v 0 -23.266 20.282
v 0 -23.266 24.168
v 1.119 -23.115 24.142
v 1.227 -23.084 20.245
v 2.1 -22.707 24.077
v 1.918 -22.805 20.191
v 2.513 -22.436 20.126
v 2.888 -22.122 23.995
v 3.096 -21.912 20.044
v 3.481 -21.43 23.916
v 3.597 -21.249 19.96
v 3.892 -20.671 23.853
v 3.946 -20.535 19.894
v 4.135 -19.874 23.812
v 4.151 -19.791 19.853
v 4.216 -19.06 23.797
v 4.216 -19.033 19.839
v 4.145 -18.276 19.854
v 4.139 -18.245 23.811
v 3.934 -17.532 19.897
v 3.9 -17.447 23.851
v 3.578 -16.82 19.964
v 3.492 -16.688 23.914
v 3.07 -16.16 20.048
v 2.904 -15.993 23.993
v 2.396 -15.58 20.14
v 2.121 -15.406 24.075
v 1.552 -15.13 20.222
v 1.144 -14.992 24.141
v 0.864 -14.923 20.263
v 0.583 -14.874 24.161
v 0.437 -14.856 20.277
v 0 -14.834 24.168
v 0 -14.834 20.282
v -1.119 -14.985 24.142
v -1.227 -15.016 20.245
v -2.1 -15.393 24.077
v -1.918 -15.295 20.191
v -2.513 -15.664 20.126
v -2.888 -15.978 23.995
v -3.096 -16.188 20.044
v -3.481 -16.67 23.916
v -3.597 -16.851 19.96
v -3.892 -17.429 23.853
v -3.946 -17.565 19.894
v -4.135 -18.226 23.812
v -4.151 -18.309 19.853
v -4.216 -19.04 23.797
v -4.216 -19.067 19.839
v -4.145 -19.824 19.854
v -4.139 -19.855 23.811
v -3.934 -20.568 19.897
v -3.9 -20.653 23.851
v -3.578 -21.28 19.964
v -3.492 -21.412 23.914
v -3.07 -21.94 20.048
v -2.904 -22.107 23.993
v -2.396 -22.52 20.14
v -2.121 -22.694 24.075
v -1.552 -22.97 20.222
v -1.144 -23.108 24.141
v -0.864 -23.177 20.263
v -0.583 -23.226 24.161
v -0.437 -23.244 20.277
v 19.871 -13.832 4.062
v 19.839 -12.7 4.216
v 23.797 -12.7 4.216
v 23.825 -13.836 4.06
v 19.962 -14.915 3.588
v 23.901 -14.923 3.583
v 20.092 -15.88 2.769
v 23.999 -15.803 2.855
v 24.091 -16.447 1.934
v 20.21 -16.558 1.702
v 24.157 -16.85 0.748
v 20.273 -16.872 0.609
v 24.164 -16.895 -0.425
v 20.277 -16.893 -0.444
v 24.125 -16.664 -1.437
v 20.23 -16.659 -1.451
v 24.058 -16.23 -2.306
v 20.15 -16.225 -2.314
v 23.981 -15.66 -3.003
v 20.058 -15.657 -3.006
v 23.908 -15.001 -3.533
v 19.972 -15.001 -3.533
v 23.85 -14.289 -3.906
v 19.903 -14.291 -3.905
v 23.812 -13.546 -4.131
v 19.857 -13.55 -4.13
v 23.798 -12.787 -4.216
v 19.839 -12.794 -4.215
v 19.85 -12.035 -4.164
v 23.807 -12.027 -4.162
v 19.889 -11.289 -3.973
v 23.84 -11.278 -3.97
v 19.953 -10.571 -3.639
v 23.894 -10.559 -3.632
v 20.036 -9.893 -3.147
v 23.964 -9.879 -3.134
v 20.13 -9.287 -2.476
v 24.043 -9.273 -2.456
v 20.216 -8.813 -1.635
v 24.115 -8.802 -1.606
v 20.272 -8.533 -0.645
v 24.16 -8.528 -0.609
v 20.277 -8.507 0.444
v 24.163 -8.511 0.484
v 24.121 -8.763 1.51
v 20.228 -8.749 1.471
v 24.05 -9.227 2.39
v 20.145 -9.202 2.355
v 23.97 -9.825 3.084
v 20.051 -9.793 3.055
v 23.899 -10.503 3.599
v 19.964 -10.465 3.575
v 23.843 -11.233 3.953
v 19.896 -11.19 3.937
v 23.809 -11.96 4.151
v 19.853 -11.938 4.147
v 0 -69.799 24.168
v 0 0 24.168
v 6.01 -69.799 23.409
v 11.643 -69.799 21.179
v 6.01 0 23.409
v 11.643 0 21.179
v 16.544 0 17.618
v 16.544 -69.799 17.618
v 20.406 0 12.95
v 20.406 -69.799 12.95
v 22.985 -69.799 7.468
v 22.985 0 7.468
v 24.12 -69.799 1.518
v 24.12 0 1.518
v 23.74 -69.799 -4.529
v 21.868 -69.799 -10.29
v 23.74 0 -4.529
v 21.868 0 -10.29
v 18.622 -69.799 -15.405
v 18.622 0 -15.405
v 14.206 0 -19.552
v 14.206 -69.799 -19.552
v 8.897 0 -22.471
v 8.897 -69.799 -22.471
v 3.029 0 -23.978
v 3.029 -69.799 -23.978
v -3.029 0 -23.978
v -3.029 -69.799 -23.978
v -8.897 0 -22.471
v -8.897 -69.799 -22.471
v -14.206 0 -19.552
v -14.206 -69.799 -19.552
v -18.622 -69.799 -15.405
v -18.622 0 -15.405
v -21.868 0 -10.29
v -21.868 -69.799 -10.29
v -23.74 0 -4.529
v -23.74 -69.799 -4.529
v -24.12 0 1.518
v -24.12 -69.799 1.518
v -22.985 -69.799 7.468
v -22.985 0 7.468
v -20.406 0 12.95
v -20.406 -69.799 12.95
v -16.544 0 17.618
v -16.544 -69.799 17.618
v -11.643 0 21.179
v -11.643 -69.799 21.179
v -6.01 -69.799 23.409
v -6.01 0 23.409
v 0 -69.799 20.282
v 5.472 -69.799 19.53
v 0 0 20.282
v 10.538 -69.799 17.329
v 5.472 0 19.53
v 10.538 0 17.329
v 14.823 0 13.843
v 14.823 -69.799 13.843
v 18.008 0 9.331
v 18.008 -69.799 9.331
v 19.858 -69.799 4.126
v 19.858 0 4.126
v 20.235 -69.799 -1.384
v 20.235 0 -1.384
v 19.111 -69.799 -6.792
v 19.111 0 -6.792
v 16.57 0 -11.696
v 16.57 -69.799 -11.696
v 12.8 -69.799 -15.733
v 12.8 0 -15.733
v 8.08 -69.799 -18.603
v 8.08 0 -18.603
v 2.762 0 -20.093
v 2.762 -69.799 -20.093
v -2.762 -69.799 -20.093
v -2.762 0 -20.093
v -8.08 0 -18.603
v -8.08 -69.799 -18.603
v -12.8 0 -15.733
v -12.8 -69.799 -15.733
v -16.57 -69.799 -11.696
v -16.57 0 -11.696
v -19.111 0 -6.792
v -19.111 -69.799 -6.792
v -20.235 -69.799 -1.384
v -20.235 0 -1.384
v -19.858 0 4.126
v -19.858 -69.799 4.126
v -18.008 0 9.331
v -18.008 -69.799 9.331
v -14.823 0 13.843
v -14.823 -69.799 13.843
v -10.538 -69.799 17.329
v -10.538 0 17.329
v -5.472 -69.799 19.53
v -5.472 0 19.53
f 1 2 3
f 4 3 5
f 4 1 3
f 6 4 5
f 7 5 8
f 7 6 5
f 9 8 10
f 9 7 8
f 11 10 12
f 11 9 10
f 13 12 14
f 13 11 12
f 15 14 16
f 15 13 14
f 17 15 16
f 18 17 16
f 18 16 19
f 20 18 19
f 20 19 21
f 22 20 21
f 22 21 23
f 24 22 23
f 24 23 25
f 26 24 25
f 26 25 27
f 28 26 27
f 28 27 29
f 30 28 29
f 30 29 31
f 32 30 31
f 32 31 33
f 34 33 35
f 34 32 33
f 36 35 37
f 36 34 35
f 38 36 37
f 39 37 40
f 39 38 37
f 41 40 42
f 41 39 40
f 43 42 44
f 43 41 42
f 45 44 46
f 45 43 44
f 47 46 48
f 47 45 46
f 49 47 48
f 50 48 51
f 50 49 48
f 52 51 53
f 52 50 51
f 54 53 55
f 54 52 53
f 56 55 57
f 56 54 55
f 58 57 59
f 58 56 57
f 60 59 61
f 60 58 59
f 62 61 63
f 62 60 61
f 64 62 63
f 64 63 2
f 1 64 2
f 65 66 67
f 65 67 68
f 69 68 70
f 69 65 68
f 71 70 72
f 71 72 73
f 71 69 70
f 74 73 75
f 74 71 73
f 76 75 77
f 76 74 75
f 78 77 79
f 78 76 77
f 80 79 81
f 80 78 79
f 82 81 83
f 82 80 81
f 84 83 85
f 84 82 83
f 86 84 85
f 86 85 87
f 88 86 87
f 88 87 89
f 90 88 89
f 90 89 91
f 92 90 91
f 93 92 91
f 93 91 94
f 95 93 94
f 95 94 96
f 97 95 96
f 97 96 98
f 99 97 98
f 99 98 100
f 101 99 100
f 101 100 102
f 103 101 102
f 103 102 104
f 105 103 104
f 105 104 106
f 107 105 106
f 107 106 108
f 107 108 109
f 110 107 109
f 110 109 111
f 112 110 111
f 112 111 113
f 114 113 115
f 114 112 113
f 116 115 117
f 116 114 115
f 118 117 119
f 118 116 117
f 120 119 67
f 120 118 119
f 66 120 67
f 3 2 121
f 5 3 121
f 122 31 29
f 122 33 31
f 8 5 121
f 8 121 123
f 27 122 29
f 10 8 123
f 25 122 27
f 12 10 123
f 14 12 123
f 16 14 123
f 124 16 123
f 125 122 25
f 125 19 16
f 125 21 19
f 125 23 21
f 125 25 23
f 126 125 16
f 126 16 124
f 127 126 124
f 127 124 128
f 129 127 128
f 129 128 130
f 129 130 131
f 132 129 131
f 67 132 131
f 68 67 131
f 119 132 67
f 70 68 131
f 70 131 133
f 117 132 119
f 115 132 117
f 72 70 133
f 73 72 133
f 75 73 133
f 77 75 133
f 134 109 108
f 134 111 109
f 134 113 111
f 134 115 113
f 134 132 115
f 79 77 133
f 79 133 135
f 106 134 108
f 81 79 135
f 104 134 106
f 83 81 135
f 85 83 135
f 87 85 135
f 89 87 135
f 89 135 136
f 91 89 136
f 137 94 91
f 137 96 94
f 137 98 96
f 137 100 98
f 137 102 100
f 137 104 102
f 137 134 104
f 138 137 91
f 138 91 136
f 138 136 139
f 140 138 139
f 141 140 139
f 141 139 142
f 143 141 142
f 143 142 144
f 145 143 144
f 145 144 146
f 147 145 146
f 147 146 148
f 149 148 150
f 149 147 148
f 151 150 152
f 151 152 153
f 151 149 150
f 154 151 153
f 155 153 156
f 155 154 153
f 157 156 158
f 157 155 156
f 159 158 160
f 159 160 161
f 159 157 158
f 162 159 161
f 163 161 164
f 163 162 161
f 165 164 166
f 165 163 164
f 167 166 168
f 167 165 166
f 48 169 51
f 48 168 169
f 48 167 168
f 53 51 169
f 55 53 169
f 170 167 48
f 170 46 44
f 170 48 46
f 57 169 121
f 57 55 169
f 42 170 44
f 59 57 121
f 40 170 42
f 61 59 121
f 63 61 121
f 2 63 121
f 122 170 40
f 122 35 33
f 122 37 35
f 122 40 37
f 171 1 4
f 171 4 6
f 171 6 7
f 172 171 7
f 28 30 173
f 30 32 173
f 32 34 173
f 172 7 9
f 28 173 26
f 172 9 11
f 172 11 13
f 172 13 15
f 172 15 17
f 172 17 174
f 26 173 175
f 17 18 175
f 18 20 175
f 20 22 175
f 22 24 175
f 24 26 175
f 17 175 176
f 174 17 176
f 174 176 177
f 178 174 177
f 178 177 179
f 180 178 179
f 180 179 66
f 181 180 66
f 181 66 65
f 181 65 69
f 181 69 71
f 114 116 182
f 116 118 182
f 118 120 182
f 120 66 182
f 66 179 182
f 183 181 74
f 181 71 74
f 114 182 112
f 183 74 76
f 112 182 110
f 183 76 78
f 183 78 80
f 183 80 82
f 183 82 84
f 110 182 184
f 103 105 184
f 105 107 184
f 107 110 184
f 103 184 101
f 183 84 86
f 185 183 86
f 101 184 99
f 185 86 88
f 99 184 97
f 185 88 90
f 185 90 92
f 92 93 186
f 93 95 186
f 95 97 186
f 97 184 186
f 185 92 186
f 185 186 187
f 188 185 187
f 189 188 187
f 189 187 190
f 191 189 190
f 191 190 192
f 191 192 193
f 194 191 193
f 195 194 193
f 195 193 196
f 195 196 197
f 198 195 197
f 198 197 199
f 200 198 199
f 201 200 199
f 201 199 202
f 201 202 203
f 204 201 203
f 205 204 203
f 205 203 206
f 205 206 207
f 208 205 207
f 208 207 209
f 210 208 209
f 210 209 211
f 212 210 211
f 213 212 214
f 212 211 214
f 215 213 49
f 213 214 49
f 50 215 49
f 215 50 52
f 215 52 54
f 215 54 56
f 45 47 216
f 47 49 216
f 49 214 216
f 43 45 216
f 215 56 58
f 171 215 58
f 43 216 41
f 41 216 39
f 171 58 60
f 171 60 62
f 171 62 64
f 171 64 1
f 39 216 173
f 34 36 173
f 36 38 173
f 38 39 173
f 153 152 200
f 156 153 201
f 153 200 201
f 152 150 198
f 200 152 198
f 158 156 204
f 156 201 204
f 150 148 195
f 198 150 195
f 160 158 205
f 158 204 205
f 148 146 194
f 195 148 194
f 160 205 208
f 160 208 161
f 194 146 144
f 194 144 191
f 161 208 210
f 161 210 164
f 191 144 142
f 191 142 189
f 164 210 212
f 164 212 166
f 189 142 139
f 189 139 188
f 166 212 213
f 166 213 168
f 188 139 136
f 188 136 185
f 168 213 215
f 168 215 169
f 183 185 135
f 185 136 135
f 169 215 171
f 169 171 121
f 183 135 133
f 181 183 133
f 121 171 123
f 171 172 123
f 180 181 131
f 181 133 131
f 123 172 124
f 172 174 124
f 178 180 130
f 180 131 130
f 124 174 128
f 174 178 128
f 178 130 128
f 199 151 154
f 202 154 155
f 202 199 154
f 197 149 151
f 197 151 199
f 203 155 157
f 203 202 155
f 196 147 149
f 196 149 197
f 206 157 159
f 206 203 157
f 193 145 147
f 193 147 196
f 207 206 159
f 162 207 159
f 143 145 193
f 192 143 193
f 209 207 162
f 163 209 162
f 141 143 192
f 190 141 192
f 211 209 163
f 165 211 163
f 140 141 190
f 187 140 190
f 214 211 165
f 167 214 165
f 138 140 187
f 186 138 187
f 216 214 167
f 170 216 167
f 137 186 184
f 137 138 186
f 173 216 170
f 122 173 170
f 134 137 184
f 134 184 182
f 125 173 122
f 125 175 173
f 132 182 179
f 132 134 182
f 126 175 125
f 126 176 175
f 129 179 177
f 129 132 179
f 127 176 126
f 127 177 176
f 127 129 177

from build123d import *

# Parameters (mm, degrees)
SKETCH1_R           = 24.1681
BOSS_EXTRUDE1_DEPTH = 69.7992
SKETCH2_R           = 20.2819
CUT_EXTRUDE1_DEPTH  = 78.718224606
SKETCH3_R           = 4.2164
CUT_EXTRUDE2_DEPTH  = 69.7992
SKETCH4_R           = 4.2164
CUT_EXTRUDE3_DEPTH  = 69.7992


with BuildPart() as part:
    # Sketch1 → Boss-Extrude1 (new body)
    with BuildSketch(Plane(origin=(0, 0, 0), x_dir=(1, 0, 0), z_dir=(0, 1, 0))):
        with Locations(Location((0, 0, 0), (0, 0, 270))):
            Circle(SKETCH1_R)
    extrude(amount=-BOSS_EXTRUDE1_DEPTH)

    # Sketch2 → Cut-Extrude1 (cut, through all)
    with BuildSketch(Plane(origin=(0, 0, 0), x_dir=(1, 0, 0), z_dir=(0, 1, 0))):
        with Locations(Location((0, 0, 0), (0, 0, 270))):
            Circle(SKETCH2_R)
    extrude(amount=-CUT_EXTRUDE1_DEPTH, mode=Mode.SUBTRACT)

    # Sketch3 → Cut-Extrude2 (cut)
    with BuildSketch(Plane.XY):
        with Locations(Location((0, -19.05, 0), (0, 0, 270))):
            Circle(SKETCH3_R)
    extrude(amount=CUT_EXTRUDE2_DEPTH, mode=Mode.SUBTRACT)

    # Sketch4 → Cut-Extrude3 (cut)
    with BuildSketch(Plane(origin=(0, 0, 0), x_dir=(0, 0, -1), z_dir=(1, 0, 0))):
        with Locations(Location((0, -12.7, 0), (0, 0, 180))):
            Circle(SKETCH4_R)
    extrude(amount=CUT_EXTRUDE3_DEPTH, mode=Mode.SUBTRACT)


solid = part.part
